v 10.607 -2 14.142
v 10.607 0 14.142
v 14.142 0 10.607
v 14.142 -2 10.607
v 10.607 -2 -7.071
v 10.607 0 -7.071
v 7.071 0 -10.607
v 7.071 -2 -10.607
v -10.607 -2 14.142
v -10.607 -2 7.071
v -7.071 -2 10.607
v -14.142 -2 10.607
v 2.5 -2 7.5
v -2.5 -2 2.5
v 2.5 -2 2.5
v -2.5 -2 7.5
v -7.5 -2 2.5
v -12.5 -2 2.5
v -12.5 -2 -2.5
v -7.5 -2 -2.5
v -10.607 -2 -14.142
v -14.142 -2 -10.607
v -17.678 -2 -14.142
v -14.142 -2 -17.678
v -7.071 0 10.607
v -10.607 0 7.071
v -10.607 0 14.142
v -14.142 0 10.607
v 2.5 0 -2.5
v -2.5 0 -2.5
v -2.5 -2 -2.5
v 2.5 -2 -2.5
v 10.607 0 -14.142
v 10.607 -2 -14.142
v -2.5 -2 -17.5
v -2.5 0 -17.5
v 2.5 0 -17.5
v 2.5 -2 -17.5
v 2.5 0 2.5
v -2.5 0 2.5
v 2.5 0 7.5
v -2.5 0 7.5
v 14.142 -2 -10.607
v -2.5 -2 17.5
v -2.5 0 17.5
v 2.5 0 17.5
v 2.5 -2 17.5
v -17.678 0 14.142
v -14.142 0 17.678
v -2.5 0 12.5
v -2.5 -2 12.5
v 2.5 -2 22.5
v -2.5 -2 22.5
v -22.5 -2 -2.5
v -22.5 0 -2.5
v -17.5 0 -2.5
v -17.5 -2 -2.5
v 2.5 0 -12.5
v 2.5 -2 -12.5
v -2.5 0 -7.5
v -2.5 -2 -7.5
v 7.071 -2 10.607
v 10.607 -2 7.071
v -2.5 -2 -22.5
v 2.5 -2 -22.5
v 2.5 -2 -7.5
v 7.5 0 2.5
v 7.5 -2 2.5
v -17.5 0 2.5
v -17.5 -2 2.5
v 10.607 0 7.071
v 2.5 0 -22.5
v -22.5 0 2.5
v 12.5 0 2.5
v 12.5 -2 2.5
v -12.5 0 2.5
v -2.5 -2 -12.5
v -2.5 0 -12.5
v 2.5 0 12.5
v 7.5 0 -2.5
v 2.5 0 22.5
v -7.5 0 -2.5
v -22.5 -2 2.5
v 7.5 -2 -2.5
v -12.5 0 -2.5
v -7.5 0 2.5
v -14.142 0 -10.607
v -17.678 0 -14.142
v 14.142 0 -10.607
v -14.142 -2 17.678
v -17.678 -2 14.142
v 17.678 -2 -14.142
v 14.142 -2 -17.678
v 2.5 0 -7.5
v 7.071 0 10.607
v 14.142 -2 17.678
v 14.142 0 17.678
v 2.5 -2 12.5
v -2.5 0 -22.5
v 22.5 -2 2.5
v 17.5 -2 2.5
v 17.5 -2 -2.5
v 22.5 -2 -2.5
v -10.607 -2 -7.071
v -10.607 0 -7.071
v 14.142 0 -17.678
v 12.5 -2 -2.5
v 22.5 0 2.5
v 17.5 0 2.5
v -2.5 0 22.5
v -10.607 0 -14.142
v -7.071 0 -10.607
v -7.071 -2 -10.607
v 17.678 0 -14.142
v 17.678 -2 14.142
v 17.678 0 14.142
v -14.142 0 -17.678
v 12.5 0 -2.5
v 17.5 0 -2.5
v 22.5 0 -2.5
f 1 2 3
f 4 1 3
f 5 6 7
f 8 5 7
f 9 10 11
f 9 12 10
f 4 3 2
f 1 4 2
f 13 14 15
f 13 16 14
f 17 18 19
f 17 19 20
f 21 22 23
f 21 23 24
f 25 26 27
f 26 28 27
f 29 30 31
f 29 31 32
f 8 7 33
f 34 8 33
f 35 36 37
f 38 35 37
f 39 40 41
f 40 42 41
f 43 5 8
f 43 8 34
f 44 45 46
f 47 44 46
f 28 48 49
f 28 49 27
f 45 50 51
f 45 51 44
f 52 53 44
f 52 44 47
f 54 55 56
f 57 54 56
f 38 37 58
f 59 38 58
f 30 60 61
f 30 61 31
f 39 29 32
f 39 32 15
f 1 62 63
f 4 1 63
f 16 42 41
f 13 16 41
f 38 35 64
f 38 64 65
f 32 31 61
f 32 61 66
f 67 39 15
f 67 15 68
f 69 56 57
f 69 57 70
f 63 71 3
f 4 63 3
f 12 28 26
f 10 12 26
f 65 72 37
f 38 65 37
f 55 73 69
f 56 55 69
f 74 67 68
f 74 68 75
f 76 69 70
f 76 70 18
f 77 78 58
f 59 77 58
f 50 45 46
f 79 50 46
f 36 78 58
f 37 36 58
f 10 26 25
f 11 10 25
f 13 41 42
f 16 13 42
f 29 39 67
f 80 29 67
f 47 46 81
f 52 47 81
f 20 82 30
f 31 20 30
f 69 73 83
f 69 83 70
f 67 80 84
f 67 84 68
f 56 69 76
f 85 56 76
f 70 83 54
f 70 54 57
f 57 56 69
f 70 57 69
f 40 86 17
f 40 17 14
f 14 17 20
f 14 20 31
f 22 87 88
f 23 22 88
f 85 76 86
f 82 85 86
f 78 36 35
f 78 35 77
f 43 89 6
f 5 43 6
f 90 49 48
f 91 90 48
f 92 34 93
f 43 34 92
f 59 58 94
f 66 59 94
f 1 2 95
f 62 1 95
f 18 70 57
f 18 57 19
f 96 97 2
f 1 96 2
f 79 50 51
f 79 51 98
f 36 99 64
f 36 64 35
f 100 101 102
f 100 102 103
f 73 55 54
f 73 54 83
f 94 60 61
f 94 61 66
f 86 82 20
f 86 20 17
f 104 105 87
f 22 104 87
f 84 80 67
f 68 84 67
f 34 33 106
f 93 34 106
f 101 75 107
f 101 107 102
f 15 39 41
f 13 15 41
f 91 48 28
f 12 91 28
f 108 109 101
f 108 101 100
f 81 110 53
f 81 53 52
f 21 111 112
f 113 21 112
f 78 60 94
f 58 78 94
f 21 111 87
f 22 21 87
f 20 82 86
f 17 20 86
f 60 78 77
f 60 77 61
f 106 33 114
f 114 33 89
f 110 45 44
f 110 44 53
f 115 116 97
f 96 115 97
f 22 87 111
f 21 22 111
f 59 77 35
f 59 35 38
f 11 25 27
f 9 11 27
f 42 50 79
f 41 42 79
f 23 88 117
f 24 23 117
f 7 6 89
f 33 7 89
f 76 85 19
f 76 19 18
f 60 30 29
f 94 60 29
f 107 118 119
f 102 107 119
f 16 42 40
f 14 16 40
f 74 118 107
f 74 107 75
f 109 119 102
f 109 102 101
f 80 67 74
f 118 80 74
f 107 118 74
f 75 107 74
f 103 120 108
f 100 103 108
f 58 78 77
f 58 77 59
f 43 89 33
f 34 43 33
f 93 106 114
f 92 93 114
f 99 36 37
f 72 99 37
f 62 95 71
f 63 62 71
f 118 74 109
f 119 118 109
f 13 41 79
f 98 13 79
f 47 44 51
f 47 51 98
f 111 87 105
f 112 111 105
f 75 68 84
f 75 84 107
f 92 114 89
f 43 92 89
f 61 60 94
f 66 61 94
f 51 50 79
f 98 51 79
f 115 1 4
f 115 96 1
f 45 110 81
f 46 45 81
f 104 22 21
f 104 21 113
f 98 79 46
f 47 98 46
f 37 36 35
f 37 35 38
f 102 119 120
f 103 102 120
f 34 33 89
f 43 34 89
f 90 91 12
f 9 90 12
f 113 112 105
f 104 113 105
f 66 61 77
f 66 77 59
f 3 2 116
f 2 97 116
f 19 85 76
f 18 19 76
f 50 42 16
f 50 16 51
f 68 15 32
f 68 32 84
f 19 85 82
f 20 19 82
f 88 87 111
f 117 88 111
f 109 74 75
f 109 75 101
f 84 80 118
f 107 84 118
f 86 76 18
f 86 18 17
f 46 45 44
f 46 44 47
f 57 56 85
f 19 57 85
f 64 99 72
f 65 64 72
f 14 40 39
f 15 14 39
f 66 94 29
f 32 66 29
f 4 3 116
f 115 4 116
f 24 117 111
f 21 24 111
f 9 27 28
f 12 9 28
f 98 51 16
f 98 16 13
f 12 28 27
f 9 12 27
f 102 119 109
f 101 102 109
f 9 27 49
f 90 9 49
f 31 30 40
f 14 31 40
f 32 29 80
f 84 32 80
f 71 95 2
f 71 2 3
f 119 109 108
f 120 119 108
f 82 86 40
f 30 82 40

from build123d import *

# Parameters (mm, degrees)
F0_W     = 5
F0_H     = 5
F1_DEPTH = 2
F2_DEPTH = 2
F3_DEPTH = 2
F4_DEPTH = 2


with BuildPart() as f1:
    # F0 (on Front) → F1 (new body)
    with BuildSketch(Plane.XZ):
        Polygon((-2.5, 2.5), (0, 2.5), (2.5, 2.5), (2.5, 7.5), (-2.5, 7.5), align=None)
        with Locations((5, 0)):
            Rectangle(F0_W, F0_H)
        with Locations((0, -5)):
            Rectangle(F0_W, F0_H)
        with Locations((-5, 0)):
            Rectangle(F0_W, F0_H)
    extrude(amount=F1_DEPTH)


with BuildPart() as f2:
    # F0 (on Front) → F2 (new body)
    with BuildSketch(Plane.XZ):
        with Locations((0, 10)):
            Rectangle(F0_W, F0_H)
        with Locations((10, 0)):
            Rectangle(F0_W, F0_H)
        with Locations((0, -10)):
            Rectangle(F0_W, F0_H)
        with Locations((-10, 0)):
            Rectangle(F0_W, F0_H)
    extrude(amount=F2_DEPTH)


with BuildPart() as f3:
    # F0 (on Front) → F3 (new body)
    with BuildSketch(Plane.XZ):
        with Locations((0, 15)):
            Rectangle(F0_W, F0_H)
        Polygon((7.071068, 10.606602), (8.838835, 8.838835), (10.606602, 7.071068), (14.142136, 10.606602), (10.606602, 14.142136), align=None)
        with Locations((15, 0)):
            Rectangle(F0_W, F0_H)
        Polygon((10.606602, -7.071068), (8.838835, -8.838835), (7.071068, -10.606602), (10.606602, -14.142136), (14.142136, -10.606602), align=None)
        with Locations((0, -15)):
            Rectangle(F0_W, F0_H)
        Polygon((-7.071068, -10.606602), (-8.838835, -8.838835), (-10.606602, -7.071068), (-14.142136, -10.606602), (-10.606602, -14.142136), align=None)
        with Locations((-15, 0)):
            Rectangle(F0_W, F0_H)
        Polygon((-10.606602, 7.071068), (-7.071068, 10.606602), (-10.606602, 14.142136), (-14.142136, 10.606602), align=None)
    extrude(amount=F3_DEPTH)


with BuildPart() as f4:
    # F0 (on Front) → F4 (new body)
    with BuildSketch(Plane.XZ):
        with Locations((0, 20)):
            Rectangle(F0_W, F0_H)
        Polygon((10.606602, 14.142136), (14.142136, 10.606602), (17.67767, 14.142136), (14.142136, 17.67767), align=None)
        with Locations((20, 0)):
            Rectangle(F0_W, F0_H)
        Polygon((14.142136, -10.606602), (10.606602, -14.142136), (14.142136, -17.67767), (17.67767, -14.142136), align=None)
        with Locations((0, -20)):
            Rectangle(F0_W, F0_H)
        Polygon((-10.606602, -14.142136), (-14.142136, -10.606602), (-17.67767, -14.142136), (-14.142136, -17.67767), align=None)
        with Locations((-20, 0)):
            Rectangle(F0_W, F0_H)
        Polygon((-14.142136, 10.606602), (-10.606602, 14.142136), (-14.142136, 17.67767), (-17.67767, 14.142136), align=None)
    extrude(amount=F4_DEPTH)


solid = Compound([f1.part, f2.part, f3.part, f4.part])
